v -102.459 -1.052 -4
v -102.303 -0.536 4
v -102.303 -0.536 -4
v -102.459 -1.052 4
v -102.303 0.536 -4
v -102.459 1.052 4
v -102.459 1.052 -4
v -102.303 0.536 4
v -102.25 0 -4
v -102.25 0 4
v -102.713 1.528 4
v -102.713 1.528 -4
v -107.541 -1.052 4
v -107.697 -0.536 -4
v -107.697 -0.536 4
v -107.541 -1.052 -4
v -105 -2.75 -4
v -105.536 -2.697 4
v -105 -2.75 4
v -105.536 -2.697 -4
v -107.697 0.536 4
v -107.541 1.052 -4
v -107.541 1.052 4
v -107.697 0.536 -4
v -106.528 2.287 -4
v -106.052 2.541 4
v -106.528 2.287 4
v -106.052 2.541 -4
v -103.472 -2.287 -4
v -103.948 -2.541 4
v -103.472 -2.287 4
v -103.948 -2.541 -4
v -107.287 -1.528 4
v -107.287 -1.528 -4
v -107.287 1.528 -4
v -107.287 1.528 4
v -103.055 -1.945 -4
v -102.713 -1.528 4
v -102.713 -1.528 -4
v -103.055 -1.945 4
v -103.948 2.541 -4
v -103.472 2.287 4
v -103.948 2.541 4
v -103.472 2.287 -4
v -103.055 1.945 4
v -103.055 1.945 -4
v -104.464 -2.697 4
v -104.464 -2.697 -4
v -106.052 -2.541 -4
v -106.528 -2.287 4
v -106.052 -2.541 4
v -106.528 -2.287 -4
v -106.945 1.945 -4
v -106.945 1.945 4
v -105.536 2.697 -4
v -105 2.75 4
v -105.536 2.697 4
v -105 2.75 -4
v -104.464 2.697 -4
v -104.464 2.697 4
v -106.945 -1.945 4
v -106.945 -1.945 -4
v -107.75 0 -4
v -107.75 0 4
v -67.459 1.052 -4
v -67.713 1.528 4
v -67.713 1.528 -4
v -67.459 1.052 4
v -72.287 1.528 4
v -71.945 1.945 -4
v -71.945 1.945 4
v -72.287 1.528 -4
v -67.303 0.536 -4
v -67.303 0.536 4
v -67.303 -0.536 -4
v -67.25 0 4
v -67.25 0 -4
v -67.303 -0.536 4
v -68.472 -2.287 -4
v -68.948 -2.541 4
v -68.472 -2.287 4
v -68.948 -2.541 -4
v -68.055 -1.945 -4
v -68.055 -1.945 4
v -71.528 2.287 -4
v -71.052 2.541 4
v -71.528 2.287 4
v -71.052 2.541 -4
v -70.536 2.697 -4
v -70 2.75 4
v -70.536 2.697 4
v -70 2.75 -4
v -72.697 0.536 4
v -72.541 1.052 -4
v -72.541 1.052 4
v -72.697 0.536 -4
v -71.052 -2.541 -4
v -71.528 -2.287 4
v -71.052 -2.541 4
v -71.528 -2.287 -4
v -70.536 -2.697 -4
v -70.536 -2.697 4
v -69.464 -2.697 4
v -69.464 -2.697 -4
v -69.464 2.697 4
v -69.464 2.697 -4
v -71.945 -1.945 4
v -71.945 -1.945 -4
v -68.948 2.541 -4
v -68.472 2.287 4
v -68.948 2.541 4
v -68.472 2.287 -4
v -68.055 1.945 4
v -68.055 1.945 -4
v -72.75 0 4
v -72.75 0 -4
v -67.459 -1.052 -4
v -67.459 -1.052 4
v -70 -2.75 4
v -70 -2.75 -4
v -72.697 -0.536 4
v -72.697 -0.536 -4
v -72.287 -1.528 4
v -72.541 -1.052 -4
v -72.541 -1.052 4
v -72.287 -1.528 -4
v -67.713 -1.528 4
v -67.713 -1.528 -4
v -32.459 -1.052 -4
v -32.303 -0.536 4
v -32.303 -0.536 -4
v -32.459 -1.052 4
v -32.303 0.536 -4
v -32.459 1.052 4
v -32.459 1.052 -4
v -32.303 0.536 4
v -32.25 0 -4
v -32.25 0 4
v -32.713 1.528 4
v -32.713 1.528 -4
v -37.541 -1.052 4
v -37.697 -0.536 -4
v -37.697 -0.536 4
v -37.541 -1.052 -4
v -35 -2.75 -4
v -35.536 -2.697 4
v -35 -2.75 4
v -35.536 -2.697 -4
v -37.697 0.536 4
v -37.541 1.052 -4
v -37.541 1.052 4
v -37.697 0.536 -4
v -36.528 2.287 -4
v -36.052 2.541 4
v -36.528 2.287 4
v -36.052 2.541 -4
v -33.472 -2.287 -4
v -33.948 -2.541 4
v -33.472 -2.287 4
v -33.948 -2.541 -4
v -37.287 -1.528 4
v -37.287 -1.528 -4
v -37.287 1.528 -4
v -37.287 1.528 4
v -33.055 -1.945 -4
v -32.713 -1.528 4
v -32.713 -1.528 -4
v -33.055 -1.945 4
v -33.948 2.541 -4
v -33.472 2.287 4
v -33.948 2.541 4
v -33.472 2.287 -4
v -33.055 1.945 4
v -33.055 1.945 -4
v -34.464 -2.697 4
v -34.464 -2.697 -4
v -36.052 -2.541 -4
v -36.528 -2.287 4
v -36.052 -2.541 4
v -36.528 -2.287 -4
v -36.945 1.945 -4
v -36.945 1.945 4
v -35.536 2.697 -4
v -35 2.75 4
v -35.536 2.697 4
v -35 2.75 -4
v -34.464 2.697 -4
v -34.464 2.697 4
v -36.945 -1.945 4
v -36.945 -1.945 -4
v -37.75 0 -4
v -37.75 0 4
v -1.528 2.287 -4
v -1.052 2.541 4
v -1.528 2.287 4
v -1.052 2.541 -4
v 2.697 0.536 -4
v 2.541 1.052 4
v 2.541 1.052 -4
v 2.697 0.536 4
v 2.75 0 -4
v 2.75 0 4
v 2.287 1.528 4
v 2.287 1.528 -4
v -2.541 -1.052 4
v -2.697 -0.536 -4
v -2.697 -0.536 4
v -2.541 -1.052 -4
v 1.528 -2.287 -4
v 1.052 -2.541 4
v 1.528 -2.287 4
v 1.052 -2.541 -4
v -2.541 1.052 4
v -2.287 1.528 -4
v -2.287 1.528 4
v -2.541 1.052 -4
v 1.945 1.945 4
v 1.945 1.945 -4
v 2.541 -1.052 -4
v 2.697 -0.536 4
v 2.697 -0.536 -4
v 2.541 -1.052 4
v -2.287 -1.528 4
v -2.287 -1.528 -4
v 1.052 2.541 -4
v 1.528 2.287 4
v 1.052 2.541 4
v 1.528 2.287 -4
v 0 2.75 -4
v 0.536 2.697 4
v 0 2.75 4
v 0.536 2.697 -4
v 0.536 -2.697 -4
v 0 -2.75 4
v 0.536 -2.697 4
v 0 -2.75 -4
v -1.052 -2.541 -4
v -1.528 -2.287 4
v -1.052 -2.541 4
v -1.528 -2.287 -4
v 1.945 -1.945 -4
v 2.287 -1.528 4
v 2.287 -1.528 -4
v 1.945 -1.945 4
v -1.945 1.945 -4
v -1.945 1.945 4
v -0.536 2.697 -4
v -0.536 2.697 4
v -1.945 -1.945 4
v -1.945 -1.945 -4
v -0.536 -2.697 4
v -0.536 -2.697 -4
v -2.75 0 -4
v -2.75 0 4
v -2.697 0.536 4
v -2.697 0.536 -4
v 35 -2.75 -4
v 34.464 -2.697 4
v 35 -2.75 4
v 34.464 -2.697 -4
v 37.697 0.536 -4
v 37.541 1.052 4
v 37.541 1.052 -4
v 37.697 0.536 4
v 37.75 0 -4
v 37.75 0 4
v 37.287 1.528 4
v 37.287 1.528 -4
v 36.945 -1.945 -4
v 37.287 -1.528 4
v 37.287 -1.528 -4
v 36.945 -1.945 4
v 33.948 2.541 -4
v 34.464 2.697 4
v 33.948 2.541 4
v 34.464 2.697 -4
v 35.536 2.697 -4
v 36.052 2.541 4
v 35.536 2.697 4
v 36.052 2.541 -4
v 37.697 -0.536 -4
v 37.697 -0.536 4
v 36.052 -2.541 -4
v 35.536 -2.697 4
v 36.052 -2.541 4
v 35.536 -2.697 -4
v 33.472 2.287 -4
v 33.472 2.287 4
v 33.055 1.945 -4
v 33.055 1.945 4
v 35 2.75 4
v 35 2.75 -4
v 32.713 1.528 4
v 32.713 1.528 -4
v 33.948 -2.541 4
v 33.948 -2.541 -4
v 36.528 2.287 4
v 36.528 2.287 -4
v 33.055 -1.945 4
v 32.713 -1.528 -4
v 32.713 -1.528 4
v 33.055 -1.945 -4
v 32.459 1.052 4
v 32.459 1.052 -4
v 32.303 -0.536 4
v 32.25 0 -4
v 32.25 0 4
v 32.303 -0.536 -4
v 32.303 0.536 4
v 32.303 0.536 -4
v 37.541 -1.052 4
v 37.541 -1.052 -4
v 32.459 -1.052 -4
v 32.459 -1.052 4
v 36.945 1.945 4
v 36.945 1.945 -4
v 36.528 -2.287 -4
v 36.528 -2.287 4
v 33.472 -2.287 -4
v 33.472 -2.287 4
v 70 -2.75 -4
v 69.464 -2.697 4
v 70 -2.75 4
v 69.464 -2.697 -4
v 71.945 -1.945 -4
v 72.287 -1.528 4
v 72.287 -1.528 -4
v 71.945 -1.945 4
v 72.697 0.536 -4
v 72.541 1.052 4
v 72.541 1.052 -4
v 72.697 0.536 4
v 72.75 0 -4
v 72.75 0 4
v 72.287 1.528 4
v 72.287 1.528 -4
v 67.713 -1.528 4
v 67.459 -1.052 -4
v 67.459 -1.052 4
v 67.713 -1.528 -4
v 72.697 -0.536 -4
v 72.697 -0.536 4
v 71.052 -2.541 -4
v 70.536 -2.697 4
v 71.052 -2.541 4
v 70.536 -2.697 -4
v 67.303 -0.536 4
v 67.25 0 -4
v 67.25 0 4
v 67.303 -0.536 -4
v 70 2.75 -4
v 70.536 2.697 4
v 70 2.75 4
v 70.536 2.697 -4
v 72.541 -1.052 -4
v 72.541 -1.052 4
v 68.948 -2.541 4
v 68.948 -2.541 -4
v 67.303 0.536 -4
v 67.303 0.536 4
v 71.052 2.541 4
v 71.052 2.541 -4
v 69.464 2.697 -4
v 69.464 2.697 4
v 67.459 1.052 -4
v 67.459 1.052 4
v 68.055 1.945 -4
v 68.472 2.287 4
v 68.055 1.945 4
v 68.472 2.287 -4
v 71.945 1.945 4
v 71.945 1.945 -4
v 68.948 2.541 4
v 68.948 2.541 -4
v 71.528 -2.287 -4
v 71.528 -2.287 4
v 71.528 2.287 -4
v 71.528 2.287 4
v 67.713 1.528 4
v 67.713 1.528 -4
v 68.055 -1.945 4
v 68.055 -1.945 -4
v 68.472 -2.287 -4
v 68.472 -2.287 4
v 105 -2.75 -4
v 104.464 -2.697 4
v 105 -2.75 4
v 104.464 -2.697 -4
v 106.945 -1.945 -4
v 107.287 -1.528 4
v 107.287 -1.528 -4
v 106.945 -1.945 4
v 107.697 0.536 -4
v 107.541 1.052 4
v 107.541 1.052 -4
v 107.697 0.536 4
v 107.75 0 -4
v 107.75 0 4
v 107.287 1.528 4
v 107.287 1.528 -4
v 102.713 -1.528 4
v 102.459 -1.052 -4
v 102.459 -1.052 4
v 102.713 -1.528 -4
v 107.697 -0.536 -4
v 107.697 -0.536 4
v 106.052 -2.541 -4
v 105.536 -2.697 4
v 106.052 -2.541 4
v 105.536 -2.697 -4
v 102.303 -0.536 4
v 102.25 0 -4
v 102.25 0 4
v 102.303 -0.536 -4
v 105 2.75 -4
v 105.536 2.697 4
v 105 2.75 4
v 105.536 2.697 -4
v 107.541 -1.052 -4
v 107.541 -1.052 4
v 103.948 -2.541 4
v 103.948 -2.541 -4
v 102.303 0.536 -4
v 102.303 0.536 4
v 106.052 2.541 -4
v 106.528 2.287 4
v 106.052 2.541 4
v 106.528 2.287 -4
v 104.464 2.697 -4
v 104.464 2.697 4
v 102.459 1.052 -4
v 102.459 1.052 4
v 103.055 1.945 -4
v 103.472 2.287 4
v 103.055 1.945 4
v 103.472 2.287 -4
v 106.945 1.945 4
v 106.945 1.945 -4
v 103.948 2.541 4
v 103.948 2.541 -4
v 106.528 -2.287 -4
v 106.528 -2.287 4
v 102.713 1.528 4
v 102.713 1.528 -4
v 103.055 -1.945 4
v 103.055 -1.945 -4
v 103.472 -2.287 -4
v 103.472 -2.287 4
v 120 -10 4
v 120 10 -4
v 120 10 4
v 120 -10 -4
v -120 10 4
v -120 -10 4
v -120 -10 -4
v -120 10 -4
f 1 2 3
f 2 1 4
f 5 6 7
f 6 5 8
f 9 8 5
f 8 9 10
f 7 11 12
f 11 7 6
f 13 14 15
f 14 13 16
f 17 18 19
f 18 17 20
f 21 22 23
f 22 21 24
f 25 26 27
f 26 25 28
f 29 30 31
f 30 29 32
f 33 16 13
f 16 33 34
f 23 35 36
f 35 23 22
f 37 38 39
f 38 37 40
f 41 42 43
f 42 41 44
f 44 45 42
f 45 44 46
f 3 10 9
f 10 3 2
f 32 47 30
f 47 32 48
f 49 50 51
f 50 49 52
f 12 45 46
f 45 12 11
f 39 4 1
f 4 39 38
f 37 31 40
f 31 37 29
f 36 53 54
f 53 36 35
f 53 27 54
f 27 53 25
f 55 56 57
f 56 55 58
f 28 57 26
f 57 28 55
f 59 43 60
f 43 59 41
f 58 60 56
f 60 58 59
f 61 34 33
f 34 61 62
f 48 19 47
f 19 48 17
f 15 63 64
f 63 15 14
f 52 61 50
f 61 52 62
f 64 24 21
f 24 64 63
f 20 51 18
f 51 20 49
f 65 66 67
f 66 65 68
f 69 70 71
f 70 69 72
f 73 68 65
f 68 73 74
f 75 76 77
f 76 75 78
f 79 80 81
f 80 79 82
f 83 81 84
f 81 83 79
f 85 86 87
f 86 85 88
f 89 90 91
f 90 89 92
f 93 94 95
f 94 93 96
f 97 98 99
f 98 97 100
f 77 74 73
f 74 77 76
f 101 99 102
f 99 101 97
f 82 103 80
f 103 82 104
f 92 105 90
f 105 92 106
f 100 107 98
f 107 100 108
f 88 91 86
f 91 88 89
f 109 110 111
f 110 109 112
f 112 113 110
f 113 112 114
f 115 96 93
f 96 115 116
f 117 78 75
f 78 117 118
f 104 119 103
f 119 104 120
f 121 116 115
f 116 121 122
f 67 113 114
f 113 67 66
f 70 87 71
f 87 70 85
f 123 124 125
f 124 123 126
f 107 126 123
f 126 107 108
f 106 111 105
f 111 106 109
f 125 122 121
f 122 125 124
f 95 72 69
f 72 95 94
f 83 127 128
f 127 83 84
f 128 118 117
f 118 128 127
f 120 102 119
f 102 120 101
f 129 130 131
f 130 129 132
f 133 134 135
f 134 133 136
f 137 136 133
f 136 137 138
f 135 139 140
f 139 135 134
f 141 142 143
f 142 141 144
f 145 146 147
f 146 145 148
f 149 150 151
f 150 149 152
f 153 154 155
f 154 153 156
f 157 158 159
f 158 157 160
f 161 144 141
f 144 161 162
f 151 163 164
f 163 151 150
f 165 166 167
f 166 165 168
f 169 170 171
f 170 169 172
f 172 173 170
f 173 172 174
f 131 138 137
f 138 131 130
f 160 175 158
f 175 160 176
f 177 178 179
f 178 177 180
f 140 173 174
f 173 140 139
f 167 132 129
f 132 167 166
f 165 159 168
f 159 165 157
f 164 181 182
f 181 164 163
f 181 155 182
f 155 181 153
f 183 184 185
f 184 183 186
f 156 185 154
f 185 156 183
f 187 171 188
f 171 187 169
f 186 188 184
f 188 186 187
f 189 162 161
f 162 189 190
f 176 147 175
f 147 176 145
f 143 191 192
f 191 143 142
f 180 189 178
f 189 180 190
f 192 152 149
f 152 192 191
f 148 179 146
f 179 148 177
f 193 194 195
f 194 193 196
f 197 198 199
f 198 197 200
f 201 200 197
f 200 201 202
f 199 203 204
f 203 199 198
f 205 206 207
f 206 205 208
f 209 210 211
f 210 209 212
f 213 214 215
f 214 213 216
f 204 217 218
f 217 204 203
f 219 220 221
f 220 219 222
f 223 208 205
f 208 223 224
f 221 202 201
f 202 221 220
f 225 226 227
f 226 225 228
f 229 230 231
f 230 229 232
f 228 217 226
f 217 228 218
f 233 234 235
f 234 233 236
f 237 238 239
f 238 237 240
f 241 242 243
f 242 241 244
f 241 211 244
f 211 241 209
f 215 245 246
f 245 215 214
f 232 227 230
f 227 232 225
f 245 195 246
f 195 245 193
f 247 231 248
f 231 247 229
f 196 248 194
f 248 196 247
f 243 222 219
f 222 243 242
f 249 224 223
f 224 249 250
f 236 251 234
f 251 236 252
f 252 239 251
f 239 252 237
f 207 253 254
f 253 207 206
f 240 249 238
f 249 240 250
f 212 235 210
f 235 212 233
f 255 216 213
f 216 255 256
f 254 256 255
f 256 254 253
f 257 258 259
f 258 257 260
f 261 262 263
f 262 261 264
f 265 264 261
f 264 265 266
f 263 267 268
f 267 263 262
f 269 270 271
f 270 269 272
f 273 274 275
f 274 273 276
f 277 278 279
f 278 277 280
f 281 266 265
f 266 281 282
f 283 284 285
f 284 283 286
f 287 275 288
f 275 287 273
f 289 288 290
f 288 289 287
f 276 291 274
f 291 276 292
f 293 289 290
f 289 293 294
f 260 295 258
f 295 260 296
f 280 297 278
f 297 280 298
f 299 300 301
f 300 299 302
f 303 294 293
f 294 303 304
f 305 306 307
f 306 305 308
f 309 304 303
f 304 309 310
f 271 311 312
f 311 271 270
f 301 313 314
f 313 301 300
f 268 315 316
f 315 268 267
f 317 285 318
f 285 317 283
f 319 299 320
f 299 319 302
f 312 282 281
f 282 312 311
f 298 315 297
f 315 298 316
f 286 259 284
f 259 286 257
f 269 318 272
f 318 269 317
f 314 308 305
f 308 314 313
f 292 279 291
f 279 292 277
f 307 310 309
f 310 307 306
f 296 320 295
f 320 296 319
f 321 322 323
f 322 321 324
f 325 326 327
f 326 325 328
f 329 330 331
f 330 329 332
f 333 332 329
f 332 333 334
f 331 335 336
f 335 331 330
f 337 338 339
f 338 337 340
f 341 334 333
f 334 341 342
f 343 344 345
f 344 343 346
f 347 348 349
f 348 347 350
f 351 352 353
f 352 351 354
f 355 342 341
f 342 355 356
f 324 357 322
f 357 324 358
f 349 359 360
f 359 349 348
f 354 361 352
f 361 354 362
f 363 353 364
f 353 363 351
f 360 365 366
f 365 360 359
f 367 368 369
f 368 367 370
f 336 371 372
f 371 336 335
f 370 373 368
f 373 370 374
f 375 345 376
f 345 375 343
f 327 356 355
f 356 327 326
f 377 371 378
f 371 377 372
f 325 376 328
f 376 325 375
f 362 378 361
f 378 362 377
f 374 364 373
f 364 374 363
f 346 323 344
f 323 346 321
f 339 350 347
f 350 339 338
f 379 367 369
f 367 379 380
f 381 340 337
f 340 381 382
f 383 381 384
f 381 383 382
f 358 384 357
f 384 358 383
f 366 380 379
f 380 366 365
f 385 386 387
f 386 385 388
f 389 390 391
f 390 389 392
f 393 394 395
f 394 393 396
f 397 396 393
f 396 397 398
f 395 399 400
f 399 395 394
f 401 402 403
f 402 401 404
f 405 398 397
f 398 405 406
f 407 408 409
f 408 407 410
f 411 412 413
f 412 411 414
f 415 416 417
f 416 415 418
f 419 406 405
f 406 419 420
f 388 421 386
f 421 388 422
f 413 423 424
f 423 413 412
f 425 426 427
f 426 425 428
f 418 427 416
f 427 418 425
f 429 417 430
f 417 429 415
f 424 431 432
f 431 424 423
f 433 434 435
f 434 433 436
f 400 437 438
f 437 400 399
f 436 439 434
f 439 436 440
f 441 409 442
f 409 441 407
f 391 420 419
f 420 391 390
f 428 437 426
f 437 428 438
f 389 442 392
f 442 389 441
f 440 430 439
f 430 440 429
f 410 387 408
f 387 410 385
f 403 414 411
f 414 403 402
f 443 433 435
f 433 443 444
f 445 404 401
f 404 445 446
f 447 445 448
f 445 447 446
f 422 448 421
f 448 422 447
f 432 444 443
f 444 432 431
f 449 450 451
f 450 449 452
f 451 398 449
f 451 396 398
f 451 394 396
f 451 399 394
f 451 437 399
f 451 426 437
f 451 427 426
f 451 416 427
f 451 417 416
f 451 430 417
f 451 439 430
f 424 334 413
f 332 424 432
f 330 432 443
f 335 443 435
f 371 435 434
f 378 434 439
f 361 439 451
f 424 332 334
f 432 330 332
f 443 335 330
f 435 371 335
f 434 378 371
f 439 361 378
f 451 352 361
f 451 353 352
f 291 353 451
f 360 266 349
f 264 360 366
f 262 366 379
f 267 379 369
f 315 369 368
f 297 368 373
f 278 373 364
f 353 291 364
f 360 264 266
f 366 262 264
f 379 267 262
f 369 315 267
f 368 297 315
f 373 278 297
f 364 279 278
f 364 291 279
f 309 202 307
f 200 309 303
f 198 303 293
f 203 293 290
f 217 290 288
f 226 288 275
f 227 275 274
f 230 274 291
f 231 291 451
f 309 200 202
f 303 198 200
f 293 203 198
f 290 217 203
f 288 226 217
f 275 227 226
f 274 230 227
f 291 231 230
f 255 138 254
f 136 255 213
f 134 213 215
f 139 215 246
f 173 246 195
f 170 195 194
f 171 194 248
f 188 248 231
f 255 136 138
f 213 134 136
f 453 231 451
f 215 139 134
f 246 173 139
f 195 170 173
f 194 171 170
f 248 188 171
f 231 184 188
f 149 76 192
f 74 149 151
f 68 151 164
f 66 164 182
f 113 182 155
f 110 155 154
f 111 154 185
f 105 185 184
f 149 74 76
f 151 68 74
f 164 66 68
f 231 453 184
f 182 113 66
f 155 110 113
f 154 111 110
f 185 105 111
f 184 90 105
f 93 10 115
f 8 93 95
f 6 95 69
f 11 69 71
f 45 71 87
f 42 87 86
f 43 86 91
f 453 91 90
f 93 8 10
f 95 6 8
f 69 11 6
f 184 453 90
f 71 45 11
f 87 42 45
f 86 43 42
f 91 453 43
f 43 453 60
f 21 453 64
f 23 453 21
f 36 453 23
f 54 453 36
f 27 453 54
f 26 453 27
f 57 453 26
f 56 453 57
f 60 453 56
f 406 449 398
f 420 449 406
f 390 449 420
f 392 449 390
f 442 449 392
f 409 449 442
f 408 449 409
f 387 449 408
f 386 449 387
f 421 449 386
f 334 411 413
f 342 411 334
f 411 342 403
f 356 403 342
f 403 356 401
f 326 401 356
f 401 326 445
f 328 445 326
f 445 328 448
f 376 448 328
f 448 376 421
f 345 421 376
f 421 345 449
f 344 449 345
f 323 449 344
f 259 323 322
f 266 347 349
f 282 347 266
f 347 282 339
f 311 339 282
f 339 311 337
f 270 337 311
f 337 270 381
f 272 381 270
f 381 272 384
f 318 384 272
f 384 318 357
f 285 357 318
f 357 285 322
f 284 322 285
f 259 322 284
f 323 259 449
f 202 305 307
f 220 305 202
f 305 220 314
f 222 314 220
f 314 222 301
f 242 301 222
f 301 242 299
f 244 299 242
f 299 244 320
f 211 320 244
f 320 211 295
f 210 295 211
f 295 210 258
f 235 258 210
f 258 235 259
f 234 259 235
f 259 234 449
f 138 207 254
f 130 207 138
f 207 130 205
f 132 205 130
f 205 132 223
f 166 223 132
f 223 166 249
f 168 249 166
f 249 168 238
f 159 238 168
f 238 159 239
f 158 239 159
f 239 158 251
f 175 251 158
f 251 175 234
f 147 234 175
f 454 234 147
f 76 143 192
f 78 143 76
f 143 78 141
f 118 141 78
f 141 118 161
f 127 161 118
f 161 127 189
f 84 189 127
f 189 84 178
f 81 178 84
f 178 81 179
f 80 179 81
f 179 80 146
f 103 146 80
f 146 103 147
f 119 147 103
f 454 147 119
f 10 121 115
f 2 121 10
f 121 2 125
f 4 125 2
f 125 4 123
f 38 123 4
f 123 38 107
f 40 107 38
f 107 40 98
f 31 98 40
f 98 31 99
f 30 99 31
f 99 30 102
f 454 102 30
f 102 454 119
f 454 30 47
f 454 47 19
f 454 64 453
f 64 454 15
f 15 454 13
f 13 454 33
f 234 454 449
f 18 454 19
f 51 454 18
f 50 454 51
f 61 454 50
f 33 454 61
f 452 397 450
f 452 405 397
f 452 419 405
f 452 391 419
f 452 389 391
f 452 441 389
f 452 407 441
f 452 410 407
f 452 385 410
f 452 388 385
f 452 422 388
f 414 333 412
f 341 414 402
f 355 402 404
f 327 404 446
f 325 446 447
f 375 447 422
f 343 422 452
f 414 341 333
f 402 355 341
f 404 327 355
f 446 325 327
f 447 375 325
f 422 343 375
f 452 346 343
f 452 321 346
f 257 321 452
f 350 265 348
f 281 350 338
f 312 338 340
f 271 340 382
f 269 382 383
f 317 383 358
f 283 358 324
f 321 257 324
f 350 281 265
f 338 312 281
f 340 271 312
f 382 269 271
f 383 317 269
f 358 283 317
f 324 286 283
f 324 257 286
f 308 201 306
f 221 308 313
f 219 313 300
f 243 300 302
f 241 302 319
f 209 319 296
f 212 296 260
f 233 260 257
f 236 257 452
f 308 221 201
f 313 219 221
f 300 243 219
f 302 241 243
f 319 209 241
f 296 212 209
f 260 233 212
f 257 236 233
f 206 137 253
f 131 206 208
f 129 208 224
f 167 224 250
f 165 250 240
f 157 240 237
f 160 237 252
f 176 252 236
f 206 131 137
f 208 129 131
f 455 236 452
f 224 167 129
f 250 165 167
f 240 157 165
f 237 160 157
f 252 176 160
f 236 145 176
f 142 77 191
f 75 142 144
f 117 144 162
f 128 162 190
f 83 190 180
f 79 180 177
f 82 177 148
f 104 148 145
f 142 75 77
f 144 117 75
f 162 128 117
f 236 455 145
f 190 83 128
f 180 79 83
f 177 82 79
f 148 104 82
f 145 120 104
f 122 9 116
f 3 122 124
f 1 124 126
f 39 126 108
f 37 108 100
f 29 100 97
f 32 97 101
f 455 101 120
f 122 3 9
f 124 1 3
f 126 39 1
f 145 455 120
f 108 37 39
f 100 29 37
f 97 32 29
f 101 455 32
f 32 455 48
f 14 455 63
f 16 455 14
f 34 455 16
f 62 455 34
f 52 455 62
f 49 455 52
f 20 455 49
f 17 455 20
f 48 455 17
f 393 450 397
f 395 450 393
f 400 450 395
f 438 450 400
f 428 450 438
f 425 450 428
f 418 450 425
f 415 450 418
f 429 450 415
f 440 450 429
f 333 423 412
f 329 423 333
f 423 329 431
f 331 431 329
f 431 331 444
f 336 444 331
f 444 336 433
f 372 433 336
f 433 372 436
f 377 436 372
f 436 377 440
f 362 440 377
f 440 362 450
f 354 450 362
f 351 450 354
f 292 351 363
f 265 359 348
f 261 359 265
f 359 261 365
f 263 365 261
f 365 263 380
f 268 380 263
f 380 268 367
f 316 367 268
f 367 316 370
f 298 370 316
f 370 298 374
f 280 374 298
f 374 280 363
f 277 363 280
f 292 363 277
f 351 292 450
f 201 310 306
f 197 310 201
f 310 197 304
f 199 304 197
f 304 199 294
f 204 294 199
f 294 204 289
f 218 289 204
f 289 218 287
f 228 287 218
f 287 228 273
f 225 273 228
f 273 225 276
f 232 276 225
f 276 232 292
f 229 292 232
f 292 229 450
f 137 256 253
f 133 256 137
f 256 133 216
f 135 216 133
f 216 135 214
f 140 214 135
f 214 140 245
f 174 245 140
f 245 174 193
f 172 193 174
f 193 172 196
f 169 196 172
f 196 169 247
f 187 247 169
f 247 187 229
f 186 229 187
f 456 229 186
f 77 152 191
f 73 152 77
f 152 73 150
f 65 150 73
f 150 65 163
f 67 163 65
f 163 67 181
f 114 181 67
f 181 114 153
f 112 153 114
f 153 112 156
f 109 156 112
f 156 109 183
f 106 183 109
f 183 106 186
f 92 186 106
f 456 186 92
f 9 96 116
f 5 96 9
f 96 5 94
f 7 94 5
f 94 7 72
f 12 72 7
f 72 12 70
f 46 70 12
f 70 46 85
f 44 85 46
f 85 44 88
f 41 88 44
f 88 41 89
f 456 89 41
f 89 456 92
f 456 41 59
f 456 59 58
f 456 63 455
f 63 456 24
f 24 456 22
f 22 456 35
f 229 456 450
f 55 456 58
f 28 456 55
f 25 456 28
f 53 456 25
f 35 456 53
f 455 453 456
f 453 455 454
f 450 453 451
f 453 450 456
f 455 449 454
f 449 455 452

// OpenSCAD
$fn = 32;

// ----------------------------------------------------------------------
// Hole bar, 7 x Ø5.5
// skip layout, 15 mm edge offset
// ----------------------------------------------------------------------

// --- parameters (mm) ---
bar_w = 20;         // bar width (Y)
bar_t = 8;          // bar thickness (Z)
holes = 7;          // holes per row
hole_d = 5.5;       // hole diameter
edge = 15;          // offset from the bar end to the first hole
grid_pitch = 17.5;  // grid the bar was laid out on

// --- derived feature positions (mm) ---
pitch = grid_pitch * 2;       // = 35   holes sit every other grid slot
span = (holes - 1) * pitch;   // = 210   distance between the end holes
bar_l = span + 2 * edge;      // = 240   overall bar length
start_x = -bar_l / 2 + edge;  // = -105   X of the first hole
feature_centers = [
  [start_x + 0 * pitch, 0],
  [start_x + 1 * pitch, 0],
  [start_x + 2 * pitch, 0],
  [start_x + 3 * pitch, 0],
  [start_x + 4 * pitch, 0],
  [start_x + 5 * pitch, 0],
  [start_x + 6 * pitch, 0]
];   // hole centres of the first row

// bar with one row of holes, drilled from feature_centers
difference() {
  translate([-bar_l / 2, -bar_w / 2, -bar_t / 2]) cube([bar_l, bar_w, bar_t]);
  for (centre = feature_centers)
    translate([centre[0], centre[1], 0])
      cylinder(d = hole_d, h = bar_t + 2, center = true);
}
